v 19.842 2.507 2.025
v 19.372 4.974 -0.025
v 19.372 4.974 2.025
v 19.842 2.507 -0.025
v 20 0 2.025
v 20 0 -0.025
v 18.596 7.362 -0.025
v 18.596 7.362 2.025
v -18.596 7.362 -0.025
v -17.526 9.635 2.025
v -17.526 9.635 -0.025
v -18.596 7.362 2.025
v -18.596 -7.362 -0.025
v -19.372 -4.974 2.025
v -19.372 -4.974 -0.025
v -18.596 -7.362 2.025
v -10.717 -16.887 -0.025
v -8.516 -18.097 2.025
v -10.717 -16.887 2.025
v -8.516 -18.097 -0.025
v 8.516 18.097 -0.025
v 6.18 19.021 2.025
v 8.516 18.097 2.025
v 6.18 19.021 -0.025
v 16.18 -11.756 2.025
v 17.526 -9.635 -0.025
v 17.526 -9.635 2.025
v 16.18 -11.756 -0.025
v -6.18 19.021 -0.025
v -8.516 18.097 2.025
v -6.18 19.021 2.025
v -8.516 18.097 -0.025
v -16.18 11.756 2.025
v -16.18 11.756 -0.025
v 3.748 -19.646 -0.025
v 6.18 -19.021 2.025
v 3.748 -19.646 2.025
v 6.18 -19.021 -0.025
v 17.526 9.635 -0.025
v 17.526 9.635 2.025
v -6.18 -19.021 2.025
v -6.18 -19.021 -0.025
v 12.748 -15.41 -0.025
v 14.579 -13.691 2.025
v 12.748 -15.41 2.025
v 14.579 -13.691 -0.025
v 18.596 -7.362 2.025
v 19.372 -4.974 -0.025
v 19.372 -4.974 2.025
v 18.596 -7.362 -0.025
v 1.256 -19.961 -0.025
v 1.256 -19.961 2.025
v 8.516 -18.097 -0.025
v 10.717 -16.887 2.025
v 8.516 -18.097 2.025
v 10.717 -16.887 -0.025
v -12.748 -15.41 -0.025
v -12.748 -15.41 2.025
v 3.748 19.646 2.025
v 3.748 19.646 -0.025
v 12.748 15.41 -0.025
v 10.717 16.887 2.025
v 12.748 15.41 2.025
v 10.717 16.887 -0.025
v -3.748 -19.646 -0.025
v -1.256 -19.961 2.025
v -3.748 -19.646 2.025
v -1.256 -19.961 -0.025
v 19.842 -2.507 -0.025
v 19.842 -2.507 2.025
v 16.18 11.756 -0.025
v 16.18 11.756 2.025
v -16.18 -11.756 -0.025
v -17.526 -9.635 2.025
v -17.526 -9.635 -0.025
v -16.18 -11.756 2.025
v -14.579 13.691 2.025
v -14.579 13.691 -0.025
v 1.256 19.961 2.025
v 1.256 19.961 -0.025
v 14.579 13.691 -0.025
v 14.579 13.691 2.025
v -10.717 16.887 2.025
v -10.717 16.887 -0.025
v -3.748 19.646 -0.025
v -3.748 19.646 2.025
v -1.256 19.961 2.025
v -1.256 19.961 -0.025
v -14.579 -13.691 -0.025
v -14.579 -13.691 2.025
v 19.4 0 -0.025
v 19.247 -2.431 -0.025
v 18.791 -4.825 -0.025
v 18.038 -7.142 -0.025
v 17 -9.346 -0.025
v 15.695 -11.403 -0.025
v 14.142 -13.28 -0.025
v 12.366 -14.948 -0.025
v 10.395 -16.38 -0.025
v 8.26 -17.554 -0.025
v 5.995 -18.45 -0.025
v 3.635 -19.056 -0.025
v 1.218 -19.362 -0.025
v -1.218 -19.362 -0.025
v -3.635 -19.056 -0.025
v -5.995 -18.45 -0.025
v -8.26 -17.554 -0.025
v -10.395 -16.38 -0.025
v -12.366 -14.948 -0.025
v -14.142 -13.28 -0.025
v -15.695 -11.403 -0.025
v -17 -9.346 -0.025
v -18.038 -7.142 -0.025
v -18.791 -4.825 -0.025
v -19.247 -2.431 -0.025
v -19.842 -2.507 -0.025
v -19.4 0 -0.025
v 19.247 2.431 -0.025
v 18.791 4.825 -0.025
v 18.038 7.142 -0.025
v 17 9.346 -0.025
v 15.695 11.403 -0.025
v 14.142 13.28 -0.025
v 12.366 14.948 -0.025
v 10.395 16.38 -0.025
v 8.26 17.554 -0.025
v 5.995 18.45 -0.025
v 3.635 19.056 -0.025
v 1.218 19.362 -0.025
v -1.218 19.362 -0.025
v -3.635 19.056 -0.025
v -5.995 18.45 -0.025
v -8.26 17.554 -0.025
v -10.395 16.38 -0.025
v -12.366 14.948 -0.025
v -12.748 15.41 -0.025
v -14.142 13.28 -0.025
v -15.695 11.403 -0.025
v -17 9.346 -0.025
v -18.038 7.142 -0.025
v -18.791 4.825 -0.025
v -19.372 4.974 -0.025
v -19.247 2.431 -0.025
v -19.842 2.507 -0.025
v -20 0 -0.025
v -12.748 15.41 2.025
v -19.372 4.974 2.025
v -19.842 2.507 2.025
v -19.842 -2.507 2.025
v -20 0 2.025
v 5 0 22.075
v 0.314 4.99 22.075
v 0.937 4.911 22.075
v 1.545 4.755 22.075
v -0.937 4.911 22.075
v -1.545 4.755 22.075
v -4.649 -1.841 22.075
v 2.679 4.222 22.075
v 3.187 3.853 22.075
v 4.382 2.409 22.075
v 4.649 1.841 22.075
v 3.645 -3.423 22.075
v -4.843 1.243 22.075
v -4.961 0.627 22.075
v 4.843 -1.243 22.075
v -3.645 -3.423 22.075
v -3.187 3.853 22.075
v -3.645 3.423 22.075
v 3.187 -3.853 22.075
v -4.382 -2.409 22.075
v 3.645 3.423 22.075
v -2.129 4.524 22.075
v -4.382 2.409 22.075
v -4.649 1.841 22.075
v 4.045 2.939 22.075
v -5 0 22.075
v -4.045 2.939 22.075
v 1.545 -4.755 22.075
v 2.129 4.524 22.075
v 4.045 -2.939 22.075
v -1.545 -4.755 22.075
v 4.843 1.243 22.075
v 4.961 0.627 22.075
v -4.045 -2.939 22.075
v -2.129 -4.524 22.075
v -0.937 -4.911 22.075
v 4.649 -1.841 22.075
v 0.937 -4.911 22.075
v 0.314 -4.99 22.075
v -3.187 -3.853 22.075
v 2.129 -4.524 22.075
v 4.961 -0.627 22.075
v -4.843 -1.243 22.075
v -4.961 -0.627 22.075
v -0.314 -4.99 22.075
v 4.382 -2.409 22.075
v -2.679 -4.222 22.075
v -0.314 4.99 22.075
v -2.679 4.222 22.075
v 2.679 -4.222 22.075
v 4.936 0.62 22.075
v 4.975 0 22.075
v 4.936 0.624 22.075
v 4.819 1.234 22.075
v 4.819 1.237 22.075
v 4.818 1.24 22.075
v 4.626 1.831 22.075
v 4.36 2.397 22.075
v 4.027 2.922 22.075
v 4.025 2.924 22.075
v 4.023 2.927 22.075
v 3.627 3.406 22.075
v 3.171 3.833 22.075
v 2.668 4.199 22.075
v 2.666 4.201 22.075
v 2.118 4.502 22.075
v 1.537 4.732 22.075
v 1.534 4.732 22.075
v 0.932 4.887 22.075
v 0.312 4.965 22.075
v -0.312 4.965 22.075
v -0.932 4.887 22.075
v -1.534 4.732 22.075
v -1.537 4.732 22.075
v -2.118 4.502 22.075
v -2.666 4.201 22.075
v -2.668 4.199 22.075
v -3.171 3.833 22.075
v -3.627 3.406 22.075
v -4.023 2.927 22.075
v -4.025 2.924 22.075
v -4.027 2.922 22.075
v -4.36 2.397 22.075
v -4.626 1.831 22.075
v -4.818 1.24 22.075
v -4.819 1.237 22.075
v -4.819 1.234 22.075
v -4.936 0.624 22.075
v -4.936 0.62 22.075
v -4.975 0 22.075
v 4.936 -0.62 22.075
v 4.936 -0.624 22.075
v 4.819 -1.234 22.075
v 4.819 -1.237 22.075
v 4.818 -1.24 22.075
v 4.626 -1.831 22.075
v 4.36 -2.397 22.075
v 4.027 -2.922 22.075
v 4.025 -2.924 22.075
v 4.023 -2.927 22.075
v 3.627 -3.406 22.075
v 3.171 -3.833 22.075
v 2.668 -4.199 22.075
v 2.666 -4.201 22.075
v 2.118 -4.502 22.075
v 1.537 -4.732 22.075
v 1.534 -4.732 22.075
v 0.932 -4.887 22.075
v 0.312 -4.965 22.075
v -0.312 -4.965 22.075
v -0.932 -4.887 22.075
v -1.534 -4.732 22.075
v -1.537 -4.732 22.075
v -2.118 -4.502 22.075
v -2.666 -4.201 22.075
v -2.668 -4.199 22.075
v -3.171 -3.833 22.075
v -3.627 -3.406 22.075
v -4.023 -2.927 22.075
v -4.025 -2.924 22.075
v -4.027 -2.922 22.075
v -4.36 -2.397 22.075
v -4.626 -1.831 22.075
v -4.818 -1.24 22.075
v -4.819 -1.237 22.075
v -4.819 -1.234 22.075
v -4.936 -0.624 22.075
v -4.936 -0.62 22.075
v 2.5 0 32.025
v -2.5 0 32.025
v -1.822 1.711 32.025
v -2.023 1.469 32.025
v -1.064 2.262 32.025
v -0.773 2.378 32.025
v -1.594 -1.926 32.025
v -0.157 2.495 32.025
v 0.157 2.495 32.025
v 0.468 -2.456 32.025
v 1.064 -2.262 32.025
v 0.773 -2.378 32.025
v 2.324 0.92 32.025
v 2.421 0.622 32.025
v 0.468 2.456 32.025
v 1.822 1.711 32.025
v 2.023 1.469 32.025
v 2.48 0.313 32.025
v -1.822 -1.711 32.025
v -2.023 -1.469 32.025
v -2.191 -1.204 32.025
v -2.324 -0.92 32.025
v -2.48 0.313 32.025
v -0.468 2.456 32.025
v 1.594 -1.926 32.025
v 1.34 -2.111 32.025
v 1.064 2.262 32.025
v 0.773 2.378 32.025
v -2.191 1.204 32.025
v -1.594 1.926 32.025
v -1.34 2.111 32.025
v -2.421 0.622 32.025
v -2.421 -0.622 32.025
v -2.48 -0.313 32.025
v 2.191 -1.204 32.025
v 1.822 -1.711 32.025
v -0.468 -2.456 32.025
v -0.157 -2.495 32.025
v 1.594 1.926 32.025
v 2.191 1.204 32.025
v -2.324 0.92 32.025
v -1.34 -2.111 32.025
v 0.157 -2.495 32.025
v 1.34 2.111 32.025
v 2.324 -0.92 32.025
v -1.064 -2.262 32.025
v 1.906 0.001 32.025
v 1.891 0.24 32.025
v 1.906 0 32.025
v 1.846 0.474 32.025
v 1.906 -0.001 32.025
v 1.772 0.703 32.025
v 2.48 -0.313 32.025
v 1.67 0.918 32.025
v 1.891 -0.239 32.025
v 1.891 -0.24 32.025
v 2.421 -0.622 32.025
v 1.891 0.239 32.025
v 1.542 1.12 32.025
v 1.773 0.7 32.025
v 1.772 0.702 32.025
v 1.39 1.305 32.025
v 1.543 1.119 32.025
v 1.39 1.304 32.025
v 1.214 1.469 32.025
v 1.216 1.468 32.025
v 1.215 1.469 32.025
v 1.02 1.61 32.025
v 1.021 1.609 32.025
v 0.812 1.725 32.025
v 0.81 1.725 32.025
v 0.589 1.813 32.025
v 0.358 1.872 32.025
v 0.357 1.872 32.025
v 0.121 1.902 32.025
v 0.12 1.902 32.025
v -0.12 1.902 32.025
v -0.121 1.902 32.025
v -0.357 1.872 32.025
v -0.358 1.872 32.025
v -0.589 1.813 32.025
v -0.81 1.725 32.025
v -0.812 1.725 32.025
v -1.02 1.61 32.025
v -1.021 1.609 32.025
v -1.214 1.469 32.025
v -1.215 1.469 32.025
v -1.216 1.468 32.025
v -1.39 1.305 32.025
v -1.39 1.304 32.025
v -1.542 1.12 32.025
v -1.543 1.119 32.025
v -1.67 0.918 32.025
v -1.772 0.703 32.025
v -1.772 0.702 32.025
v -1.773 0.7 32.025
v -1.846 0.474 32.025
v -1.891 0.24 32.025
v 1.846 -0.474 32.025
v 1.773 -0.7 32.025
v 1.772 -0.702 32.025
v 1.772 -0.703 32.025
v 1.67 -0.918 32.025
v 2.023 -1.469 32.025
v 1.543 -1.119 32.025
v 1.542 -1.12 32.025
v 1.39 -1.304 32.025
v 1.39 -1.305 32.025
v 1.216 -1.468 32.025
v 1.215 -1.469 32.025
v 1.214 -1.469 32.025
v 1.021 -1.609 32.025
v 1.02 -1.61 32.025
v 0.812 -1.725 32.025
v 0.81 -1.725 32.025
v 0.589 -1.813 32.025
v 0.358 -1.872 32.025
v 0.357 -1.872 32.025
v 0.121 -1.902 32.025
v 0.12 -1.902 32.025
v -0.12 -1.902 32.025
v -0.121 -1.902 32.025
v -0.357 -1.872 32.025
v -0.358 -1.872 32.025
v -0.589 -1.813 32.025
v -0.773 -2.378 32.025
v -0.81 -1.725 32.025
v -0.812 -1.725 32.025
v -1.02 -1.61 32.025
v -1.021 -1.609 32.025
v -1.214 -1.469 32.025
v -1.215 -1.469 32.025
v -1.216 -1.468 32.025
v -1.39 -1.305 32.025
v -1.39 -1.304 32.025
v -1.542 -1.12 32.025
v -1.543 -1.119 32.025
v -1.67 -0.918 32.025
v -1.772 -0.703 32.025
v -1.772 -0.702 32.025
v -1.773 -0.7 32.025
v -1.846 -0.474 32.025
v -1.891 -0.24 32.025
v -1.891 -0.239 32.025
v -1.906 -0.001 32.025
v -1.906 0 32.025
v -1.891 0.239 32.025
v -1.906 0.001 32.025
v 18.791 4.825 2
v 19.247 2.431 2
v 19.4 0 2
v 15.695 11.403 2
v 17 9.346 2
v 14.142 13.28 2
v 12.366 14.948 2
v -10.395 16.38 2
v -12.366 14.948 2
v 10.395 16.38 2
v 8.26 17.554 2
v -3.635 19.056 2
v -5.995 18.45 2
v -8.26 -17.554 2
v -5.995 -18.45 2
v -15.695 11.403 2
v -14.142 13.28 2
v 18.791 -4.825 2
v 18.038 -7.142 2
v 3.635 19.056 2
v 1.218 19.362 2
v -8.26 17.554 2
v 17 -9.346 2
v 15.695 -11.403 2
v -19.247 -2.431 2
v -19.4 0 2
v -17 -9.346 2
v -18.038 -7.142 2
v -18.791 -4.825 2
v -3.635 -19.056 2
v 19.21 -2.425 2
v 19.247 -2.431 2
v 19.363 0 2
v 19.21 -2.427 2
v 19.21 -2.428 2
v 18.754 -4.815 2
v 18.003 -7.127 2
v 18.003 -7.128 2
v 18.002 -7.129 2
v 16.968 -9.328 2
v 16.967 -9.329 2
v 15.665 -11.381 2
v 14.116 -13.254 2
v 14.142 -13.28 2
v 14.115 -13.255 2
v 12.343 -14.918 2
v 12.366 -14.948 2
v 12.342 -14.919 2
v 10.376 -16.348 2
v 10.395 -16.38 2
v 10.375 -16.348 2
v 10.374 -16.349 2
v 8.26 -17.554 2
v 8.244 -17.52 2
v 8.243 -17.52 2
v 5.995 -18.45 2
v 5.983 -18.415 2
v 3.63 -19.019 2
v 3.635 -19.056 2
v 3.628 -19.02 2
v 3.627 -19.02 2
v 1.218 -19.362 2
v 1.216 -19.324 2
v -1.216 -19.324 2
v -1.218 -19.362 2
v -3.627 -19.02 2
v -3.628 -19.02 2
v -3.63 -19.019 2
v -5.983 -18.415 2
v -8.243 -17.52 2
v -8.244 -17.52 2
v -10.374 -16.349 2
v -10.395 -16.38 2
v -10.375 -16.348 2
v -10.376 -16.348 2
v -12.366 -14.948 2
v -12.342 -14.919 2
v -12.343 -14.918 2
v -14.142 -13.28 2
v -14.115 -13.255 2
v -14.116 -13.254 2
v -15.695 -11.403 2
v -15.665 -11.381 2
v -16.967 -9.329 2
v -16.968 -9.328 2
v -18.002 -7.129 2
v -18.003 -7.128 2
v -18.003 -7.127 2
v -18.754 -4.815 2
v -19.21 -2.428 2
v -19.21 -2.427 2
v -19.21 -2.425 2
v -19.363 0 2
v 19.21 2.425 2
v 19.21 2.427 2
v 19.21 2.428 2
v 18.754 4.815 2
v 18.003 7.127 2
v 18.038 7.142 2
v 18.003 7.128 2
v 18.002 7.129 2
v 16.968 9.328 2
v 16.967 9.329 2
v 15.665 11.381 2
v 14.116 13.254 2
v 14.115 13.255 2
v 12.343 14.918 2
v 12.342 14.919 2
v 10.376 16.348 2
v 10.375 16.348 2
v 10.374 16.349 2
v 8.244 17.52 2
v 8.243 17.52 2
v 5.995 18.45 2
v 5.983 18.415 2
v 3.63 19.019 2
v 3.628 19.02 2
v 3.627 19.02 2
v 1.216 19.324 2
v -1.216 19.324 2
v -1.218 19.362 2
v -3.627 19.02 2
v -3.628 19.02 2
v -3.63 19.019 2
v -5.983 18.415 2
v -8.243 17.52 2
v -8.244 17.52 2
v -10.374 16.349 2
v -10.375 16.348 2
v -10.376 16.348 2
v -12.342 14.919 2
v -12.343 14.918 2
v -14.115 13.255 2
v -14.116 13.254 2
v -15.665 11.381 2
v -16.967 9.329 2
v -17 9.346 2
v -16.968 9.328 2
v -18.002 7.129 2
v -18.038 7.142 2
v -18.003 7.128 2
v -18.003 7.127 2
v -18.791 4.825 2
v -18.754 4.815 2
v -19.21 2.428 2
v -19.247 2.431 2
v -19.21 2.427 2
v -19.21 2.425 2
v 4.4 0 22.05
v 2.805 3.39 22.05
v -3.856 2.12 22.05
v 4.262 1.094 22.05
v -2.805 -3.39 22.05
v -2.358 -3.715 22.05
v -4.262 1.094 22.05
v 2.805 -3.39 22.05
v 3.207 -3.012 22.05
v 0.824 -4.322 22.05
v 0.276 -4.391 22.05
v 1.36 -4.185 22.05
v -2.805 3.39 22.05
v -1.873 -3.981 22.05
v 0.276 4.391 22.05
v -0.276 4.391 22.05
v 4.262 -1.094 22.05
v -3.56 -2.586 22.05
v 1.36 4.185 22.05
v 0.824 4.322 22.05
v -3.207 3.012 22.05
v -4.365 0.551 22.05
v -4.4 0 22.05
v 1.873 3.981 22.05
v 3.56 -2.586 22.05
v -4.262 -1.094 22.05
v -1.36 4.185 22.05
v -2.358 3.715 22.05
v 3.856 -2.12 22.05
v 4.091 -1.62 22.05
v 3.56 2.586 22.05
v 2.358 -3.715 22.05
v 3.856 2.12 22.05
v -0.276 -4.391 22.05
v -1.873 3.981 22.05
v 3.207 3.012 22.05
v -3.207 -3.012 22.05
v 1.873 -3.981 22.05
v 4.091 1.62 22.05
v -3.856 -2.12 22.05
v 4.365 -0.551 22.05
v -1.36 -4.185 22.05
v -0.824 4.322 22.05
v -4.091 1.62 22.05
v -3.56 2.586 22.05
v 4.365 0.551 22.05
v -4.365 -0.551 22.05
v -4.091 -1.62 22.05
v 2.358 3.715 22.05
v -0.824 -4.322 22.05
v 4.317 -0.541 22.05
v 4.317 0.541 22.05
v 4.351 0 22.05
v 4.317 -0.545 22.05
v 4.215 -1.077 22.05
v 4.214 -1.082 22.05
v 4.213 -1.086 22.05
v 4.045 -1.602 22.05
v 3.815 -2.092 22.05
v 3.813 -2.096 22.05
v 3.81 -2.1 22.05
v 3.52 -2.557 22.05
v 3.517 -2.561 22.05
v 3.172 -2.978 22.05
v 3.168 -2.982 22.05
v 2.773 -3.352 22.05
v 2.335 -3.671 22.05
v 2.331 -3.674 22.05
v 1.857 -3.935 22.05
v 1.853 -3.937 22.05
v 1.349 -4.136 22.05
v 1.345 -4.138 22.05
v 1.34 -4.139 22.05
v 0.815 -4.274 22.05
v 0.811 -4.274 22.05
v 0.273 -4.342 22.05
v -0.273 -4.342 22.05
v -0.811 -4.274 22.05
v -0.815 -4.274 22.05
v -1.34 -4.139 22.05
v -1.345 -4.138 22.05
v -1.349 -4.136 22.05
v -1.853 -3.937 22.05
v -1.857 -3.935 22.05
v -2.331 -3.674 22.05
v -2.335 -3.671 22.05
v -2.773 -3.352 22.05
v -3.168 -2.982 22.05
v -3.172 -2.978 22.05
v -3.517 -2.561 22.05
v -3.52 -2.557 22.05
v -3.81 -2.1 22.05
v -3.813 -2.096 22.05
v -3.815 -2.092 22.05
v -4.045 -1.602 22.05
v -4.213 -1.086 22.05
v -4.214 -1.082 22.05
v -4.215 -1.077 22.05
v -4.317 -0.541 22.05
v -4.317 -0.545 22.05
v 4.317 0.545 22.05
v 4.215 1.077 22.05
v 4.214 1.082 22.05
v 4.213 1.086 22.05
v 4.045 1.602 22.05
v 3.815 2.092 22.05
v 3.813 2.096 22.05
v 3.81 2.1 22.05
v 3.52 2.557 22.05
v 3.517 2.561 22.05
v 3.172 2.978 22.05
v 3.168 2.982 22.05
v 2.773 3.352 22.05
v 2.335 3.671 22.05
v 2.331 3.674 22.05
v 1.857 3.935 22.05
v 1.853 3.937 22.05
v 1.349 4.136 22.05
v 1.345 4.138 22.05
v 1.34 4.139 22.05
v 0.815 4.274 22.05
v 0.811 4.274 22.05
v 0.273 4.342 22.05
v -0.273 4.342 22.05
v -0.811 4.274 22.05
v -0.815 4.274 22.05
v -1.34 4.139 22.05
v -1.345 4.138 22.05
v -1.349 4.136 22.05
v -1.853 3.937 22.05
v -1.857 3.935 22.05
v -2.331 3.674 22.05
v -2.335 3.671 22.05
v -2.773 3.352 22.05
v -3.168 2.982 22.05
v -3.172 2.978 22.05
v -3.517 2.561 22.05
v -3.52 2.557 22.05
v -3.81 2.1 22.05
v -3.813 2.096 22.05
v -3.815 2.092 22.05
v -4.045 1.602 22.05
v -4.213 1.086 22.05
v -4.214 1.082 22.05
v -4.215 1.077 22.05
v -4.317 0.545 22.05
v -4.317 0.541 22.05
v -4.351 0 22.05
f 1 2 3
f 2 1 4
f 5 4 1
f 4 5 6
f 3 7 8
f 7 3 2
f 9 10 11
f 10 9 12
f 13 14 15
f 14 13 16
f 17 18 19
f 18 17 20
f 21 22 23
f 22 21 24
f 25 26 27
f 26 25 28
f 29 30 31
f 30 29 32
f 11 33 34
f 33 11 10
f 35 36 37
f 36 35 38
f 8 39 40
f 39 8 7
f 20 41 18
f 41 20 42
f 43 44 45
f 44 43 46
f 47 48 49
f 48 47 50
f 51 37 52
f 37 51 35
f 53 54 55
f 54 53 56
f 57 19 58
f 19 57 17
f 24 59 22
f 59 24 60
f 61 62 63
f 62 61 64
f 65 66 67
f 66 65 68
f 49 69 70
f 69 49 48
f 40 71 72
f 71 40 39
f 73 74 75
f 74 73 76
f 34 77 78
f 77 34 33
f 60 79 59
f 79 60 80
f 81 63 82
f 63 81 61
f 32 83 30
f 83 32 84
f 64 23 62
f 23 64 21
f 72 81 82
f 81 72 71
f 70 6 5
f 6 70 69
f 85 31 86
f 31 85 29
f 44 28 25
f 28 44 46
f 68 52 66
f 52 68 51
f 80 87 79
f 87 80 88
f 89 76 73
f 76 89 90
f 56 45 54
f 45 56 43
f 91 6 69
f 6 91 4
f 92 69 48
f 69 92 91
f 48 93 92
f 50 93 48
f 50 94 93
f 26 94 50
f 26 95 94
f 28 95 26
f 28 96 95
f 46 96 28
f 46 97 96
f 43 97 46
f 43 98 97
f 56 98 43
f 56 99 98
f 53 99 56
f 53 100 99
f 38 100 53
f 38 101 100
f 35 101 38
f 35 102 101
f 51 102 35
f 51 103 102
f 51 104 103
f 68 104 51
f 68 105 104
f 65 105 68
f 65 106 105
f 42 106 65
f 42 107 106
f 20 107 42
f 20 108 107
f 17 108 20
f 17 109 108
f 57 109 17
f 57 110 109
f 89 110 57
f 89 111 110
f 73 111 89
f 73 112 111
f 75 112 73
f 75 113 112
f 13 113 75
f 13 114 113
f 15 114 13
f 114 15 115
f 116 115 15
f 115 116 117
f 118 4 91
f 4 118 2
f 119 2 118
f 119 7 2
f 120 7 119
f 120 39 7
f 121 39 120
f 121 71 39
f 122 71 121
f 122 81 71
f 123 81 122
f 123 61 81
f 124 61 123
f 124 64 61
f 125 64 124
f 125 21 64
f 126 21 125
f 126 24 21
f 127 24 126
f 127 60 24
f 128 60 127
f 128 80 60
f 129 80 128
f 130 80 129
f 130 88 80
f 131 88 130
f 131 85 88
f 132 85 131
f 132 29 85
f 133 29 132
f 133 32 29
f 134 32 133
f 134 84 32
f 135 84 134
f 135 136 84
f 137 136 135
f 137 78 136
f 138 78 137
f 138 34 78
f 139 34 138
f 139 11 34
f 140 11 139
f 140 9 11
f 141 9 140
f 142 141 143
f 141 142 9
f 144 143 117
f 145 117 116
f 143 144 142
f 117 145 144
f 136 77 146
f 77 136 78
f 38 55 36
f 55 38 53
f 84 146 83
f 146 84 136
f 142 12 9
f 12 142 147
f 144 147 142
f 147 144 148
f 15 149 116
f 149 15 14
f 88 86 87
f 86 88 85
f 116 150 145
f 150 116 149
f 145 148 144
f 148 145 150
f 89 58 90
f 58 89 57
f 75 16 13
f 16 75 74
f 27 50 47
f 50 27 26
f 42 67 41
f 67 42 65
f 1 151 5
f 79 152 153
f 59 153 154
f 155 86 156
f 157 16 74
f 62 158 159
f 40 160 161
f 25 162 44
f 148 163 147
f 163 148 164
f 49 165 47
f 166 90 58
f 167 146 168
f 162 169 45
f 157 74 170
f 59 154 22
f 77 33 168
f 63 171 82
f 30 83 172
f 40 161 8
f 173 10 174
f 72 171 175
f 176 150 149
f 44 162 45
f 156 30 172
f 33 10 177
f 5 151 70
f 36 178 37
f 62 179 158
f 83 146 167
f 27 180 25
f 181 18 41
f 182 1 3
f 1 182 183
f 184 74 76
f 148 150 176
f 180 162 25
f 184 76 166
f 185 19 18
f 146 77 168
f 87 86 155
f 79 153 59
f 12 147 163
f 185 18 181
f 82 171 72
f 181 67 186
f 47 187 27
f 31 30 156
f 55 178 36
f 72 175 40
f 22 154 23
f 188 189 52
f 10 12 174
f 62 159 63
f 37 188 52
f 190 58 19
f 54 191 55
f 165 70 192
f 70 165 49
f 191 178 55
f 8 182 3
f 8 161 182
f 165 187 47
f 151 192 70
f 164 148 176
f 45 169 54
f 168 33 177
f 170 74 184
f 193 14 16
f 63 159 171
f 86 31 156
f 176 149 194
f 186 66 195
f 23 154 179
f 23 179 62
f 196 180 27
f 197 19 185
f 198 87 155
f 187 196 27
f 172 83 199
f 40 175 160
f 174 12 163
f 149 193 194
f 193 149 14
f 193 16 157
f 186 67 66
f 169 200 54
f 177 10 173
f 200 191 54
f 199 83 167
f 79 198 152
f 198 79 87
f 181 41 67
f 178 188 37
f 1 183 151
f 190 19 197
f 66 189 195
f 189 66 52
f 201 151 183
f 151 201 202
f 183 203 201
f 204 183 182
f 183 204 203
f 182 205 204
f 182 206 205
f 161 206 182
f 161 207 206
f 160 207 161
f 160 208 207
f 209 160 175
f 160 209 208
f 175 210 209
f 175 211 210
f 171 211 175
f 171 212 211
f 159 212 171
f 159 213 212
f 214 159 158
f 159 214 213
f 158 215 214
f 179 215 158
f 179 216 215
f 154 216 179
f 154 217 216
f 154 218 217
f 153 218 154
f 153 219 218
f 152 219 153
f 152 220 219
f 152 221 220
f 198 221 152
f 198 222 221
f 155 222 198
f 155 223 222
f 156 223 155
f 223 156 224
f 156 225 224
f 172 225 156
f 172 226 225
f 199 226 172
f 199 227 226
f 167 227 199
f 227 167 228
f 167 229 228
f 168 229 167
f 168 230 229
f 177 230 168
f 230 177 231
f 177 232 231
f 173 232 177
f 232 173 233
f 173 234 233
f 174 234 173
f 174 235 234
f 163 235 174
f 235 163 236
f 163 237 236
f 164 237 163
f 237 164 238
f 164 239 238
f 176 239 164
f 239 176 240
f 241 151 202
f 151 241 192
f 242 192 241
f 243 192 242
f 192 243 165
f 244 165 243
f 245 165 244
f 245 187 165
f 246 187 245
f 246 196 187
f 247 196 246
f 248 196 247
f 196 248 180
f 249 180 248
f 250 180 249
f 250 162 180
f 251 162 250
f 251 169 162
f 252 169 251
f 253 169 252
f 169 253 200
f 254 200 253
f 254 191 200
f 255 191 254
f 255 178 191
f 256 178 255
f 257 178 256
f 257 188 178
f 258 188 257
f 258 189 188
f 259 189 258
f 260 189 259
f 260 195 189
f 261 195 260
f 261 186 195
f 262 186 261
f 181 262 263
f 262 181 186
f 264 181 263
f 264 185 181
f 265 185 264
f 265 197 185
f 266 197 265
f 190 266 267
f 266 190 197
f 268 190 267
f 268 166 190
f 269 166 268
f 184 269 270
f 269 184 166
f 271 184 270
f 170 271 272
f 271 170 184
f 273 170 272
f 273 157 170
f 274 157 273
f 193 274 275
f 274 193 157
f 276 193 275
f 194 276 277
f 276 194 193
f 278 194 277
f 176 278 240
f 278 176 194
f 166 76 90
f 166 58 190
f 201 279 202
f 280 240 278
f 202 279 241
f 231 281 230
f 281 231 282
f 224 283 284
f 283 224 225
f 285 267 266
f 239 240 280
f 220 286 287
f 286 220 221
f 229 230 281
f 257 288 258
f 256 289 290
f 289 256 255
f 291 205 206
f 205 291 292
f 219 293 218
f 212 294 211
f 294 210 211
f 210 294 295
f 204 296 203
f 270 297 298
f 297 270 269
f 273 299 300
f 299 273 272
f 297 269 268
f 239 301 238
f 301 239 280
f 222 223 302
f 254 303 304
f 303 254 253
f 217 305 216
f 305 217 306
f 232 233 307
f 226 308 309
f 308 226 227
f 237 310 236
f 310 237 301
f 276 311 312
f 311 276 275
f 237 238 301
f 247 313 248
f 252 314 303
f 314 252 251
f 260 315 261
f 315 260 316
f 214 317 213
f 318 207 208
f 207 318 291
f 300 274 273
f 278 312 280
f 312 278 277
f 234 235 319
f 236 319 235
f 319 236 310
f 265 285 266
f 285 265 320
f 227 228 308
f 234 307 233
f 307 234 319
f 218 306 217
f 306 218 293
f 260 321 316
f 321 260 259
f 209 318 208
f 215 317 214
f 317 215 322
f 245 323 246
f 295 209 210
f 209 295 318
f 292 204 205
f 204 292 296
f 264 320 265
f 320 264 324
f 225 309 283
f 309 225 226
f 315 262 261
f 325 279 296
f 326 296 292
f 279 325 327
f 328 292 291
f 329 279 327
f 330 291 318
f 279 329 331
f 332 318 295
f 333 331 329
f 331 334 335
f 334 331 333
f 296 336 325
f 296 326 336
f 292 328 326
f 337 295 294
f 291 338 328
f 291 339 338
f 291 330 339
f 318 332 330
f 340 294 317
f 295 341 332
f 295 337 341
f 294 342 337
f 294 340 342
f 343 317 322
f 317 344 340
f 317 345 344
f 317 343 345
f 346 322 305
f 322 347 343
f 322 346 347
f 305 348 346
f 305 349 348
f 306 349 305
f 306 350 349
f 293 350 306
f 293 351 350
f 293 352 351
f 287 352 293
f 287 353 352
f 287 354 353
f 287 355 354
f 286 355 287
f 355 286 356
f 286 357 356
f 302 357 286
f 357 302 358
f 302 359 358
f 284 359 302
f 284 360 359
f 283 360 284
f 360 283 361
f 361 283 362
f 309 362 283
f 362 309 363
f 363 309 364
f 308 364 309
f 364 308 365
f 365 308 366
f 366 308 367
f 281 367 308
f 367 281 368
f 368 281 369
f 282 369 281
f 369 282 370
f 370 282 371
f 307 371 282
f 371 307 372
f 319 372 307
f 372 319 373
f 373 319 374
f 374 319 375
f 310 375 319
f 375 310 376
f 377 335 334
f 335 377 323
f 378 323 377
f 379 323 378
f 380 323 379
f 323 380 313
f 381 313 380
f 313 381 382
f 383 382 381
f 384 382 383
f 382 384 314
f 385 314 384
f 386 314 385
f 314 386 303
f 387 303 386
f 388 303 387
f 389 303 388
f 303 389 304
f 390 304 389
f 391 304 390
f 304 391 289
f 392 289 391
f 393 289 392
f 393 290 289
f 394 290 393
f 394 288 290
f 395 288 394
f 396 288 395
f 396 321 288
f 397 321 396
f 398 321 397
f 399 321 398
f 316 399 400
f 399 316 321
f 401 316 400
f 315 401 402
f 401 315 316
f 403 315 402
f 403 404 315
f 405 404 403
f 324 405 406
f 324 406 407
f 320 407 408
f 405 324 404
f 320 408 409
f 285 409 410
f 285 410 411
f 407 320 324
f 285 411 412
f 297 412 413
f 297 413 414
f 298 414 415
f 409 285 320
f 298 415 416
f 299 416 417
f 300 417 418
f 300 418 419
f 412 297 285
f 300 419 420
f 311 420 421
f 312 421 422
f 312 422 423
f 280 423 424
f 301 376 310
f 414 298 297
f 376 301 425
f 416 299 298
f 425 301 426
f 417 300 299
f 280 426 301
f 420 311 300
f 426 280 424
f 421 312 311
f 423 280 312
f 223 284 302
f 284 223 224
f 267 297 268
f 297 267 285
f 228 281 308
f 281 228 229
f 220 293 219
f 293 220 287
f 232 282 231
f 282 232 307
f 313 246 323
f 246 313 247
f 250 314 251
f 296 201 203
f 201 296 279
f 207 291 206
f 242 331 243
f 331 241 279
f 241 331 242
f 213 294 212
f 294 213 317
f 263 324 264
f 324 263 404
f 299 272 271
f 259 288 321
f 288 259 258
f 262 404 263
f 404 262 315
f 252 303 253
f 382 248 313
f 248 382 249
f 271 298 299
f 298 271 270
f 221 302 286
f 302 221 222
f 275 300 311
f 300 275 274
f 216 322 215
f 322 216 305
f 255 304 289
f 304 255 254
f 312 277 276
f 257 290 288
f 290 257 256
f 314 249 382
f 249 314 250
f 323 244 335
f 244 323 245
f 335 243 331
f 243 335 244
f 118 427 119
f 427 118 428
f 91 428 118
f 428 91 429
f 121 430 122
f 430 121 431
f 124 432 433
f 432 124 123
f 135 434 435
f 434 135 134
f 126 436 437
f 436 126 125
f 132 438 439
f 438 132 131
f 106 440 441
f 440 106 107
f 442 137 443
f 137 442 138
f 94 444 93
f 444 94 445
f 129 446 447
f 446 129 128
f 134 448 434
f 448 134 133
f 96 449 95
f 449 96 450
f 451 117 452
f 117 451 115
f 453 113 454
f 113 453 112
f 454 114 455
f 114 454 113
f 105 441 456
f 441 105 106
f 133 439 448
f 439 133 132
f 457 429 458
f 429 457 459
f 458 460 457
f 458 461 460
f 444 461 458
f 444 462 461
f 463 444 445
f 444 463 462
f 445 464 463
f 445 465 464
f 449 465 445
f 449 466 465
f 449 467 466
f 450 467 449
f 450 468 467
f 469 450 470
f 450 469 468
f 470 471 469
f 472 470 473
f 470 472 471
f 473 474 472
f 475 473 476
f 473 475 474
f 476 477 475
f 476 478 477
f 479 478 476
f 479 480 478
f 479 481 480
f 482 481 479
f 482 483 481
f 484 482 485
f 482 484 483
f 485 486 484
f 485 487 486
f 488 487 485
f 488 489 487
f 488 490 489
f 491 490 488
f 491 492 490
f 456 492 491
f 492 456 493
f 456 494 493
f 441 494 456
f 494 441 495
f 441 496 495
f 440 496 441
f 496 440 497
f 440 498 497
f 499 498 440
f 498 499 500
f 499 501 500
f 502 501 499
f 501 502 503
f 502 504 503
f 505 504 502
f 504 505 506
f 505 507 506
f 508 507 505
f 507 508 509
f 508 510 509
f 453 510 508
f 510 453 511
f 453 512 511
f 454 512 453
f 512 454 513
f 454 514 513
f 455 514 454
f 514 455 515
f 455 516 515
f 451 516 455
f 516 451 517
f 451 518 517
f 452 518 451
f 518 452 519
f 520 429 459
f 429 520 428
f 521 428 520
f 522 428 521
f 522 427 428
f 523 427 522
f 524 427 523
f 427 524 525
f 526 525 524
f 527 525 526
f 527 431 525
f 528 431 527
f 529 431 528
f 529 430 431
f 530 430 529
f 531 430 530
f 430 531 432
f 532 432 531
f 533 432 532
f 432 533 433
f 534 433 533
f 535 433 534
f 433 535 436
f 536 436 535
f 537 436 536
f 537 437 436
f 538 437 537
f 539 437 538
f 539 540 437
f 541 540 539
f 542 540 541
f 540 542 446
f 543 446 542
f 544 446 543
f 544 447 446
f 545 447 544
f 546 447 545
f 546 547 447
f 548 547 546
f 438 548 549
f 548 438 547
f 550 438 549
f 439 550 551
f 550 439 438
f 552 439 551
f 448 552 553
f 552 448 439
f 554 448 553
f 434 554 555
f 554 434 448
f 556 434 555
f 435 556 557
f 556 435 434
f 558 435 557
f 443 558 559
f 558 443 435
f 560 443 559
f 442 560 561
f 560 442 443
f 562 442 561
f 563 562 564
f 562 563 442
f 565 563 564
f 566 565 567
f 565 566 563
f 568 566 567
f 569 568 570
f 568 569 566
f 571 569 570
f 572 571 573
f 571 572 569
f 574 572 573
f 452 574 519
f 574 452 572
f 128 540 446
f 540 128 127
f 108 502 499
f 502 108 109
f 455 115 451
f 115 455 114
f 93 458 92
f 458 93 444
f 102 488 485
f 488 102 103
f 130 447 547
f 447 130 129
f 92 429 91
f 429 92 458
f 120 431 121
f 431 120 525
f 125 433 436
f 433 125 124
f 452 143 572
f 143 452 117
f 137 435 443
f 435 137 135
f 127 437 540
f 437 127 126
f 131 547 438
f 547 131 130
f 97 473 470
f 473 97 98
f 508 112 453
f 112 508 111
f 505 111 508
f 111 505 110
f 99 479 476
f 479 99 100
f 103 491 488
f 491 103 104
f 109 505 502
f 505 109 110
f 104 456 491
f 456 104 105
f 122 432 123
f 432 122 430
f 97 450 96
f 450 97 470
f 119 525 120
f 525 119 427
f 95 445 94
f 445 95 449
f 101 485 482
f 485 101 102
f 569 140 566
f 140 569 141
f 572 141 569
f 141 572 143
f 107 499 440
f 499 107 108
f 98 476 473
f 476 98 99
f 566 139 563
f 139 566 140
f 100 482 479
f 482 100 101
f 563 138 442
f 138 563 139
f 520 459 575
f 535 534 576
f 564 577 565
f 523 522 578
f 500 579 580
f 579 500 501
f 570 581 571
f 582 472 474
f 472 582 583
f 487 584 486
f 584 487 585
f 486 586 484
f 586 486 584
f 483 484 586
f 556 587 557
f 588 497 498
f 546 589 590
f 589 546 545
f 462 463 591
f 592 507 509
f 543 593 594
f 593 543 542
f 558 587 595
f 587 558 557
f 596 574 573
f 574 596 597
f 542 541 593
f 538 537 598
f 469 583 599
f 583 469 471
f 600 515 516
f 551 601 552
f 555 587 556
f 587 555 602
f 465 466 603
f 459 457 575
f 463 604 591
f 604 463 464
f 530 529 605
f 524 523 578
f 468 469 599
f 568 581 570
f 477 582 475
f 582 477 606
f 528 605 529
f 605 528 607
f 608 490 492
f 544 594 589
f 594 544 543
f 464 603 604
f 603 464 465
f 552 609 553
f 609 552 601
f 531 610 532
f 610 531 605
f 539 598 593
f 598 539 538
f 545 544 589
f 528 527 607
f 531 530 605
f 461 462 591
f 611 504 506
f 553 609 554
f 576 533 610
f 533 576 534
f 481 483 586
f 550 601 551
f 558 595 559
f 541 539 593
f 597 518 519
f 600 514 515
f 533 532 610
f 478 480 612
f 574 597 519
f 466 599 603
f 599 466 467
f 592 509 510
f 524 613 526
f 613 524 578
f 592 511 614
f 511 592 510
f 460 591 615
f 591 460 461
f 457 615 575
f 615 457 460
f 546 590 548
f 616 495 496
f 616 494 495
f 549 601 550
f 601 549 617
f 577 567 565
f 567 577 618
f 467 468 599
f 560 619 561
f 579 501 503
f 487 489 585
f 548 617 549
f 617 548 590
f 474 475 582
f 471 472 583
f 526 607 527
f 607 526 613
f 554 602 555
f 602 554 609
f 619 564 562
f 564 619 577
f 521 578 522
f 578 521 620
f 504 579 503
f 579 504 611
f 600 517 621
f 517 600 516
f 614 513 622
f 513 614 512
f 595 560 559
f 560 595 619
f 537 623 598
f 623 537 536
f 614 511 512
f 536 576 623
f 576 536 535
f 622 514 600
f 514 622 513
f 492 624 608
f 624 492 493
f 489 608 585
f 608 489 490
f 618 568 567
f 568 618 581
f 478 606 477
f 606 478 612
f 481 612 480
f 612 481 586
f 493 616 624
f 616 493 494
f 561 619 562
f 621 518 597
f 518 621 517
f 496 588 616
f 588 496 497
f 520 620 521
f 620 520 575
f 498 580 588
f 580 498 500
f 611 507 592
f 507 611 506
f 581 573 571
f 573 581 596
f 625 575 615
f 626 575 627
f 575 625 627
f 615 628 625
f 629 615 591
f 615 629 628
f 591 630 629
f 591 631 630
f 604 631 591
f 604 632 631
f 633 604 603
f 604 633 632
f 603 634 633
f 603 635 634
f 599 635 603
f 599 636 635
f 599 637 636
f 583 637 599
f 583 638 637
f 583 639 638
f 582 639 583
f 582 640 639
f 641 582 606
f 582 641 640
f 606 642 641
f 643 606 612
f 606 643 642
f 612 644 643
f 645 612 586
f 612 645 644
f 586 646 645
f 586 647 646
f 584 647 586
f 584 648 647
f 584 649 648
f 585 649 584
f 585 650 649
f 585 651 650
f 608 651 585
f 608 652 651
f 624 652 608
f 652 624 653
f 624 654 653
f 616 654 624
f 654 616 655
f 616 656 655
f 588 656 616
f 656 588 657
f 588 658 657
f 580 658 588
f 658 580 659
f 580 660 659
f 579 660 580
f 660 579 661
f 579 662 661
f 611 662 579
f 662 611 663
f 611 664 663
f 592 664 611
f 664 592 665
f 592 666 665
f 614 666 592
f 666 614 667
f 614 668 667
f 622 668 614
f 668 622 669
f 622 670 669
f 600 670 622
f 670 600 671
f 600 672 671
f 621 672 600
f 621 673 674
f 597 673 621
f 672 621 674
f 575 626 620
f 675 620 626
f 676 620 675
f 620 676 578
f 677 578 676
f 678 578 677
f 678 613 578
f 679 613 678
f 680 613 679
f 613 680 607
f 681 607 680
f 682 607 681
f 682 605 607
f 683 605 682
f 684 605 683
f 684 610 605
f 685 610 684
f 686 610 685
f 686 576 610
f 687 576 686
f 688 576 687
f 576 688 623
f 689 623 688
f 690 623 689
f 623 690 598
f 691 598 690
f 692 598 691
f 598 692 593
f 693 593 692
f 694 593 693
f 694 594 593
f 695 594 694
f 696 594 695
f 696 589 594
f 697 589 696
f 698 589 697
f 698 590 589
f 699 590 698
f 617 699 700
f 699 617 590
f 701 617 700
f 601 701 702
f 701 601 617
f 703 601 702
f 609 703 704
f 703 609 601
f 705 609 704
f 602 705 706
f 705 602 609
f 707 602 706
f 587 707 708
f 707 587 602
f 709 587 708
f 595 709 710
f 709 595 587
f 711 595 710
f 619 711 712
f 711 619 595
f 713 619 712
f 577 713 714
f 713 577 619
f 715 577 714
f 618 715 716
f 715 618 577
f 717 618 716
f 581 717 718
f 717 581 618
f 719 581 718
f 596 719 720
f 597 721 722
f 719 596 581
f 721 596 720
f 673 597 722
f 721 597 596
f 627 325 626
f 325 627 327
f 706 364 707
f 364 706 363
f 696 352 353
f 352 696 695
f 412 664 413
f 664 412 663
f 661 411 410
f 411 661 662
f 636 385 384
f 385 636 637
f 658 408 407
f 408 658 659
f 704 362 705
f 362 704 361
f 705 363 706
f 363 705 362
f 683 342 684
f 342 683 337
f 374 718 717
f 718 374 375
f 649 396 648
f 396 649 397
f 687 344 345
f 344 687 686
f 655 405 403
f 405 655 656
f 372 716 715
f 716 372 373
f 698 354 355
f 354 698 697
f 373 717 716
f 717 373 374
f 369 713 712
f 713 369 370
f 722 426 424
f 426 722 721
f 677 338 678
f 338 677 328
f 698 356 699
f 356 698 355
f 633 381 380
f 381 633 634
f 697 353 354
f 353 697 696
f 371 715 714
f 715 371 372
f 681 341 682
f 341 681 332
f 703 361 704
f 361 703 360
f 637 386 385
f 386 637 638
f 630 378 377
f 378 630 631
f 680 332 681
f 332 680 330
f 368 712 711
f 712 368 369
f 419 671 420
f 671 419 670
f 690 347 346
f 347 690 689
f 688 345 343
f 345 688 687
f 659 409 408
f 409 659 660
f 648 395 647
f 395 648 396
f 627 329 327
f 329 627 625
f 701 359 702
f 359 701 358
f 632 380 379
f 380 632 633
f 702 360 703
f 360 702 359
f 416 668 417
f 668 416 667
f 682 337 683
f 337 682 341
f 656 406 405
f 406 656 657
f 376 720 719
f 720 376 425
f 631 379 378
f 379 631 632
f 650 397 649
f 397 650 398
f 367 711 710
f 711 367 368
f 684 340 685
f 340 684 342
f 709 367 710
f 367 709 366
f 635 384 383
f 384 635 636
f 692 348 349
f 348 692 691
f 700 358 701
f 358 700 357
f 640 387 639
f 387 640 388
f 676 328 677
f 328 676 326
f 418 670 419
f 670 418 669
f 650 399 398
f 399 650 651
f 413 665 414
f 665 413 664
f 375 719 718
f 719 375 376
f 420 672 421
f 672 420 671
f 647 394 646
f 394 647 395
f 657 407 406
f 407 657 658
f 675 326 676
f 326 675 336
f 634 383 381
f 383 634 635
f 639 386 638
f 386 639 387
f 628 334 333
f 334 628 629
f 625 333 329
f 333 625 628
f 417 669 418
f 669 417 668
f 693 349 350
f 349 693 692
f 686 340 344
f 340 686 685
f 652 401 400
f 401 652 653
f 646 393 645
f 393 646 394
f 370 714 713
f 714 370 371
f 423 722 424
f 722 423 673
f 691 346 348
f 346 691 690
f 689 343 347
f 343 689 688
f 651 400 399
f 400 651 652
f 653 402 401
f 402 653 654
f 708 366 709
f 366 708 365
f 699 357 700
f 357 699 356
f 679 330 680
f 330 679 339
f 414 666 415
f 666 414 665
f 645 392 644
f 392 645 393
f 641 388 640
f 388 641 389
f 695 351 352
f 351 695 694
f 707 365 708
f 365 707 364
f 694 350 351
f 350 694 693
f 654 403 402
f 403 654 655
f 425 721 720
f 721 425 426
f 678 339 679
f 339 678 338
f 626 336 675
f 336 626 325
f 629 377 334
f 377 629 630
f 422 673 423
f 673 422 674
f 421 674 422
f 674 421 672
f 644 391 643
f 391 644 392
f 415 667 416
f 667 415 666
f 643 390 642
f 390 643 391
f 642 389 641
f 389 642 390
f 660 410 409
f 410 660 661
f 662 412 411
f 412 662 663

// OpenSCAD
//copyright 2014 Richard Swika (a.k.a. Zick)
//All Rights Reserved
//Rev. Orig - Augest 19, 2014 - Good for bottom filling resin molds
//Rev. A - March 25, 2016 - Updated to work with changes to customizer
/* [Dimensions] */

//Diameter of funnel mouth? (mm)
funnelTopD = 40; //[10:200]

//Length of funnel mouth? (mm)
funnelTopL = 2; //[0:200]

//Diameter at bottom of funnel taper? (mm)
funnelBottomD = 10; //[5:200]

//Length of funnel taper? (mm)
funnelL = 20; //[10:200]

//Diameter of egress? (mm)
egressD= 5; //[5:200]

//Length of egress? (mm)
egressL = 10; //[0:200]

//Thickness of walls? (micron)
wallT = 400; //[300:5000] 

/* [Private] */
tiny=0.05;
$fn=50;
module funnel()
{
	translate([0,0,0]) 
		difference(){
		union(){
			translate([0,0,(funnelTopL)/2]) 
			cylinder(d=funnelTopD,h=funnelTopL+tiny,center=true);
			translate([0,0,tiny+funnelTopL+funnelL/2]) 
			cylinder(d1=funnelTopD,d2=funnelBottomD,h=funnelL+tiny,center=true);
			translate([0,0,funnelTopL+funnelL+egressL/2]) 
			cylinder(d1=funnelBottomD,d2=egressD,h=egressL+tiny,center=true);
		}
		translate([0,0,-tiny])
		union(){
			translate([0,0,(funnelTopL)/2]) 
			cylinder(d=funnelTopD-wallT*0.003,h=funnelTopL+2*tiny,center=true);
			translate([0,0,tiny+funnelTopL+funnelL/2]) 
			cylinder(d1=funnelTopD-wallT*0.003,d2=funnelBottomD-wallT*0.003,h=funnelL+2*tiny,center=true);
			translate([0,0,funnelTopL+funnelL+egressL/2]) 
			cylinder(d1=funnelBottomD-wallT*0.003,d2=egressD-wallT*0.003,h=egressL+4*tiny,center=true);
		}

	}
}

rotate([0,0,0]) funnel();
